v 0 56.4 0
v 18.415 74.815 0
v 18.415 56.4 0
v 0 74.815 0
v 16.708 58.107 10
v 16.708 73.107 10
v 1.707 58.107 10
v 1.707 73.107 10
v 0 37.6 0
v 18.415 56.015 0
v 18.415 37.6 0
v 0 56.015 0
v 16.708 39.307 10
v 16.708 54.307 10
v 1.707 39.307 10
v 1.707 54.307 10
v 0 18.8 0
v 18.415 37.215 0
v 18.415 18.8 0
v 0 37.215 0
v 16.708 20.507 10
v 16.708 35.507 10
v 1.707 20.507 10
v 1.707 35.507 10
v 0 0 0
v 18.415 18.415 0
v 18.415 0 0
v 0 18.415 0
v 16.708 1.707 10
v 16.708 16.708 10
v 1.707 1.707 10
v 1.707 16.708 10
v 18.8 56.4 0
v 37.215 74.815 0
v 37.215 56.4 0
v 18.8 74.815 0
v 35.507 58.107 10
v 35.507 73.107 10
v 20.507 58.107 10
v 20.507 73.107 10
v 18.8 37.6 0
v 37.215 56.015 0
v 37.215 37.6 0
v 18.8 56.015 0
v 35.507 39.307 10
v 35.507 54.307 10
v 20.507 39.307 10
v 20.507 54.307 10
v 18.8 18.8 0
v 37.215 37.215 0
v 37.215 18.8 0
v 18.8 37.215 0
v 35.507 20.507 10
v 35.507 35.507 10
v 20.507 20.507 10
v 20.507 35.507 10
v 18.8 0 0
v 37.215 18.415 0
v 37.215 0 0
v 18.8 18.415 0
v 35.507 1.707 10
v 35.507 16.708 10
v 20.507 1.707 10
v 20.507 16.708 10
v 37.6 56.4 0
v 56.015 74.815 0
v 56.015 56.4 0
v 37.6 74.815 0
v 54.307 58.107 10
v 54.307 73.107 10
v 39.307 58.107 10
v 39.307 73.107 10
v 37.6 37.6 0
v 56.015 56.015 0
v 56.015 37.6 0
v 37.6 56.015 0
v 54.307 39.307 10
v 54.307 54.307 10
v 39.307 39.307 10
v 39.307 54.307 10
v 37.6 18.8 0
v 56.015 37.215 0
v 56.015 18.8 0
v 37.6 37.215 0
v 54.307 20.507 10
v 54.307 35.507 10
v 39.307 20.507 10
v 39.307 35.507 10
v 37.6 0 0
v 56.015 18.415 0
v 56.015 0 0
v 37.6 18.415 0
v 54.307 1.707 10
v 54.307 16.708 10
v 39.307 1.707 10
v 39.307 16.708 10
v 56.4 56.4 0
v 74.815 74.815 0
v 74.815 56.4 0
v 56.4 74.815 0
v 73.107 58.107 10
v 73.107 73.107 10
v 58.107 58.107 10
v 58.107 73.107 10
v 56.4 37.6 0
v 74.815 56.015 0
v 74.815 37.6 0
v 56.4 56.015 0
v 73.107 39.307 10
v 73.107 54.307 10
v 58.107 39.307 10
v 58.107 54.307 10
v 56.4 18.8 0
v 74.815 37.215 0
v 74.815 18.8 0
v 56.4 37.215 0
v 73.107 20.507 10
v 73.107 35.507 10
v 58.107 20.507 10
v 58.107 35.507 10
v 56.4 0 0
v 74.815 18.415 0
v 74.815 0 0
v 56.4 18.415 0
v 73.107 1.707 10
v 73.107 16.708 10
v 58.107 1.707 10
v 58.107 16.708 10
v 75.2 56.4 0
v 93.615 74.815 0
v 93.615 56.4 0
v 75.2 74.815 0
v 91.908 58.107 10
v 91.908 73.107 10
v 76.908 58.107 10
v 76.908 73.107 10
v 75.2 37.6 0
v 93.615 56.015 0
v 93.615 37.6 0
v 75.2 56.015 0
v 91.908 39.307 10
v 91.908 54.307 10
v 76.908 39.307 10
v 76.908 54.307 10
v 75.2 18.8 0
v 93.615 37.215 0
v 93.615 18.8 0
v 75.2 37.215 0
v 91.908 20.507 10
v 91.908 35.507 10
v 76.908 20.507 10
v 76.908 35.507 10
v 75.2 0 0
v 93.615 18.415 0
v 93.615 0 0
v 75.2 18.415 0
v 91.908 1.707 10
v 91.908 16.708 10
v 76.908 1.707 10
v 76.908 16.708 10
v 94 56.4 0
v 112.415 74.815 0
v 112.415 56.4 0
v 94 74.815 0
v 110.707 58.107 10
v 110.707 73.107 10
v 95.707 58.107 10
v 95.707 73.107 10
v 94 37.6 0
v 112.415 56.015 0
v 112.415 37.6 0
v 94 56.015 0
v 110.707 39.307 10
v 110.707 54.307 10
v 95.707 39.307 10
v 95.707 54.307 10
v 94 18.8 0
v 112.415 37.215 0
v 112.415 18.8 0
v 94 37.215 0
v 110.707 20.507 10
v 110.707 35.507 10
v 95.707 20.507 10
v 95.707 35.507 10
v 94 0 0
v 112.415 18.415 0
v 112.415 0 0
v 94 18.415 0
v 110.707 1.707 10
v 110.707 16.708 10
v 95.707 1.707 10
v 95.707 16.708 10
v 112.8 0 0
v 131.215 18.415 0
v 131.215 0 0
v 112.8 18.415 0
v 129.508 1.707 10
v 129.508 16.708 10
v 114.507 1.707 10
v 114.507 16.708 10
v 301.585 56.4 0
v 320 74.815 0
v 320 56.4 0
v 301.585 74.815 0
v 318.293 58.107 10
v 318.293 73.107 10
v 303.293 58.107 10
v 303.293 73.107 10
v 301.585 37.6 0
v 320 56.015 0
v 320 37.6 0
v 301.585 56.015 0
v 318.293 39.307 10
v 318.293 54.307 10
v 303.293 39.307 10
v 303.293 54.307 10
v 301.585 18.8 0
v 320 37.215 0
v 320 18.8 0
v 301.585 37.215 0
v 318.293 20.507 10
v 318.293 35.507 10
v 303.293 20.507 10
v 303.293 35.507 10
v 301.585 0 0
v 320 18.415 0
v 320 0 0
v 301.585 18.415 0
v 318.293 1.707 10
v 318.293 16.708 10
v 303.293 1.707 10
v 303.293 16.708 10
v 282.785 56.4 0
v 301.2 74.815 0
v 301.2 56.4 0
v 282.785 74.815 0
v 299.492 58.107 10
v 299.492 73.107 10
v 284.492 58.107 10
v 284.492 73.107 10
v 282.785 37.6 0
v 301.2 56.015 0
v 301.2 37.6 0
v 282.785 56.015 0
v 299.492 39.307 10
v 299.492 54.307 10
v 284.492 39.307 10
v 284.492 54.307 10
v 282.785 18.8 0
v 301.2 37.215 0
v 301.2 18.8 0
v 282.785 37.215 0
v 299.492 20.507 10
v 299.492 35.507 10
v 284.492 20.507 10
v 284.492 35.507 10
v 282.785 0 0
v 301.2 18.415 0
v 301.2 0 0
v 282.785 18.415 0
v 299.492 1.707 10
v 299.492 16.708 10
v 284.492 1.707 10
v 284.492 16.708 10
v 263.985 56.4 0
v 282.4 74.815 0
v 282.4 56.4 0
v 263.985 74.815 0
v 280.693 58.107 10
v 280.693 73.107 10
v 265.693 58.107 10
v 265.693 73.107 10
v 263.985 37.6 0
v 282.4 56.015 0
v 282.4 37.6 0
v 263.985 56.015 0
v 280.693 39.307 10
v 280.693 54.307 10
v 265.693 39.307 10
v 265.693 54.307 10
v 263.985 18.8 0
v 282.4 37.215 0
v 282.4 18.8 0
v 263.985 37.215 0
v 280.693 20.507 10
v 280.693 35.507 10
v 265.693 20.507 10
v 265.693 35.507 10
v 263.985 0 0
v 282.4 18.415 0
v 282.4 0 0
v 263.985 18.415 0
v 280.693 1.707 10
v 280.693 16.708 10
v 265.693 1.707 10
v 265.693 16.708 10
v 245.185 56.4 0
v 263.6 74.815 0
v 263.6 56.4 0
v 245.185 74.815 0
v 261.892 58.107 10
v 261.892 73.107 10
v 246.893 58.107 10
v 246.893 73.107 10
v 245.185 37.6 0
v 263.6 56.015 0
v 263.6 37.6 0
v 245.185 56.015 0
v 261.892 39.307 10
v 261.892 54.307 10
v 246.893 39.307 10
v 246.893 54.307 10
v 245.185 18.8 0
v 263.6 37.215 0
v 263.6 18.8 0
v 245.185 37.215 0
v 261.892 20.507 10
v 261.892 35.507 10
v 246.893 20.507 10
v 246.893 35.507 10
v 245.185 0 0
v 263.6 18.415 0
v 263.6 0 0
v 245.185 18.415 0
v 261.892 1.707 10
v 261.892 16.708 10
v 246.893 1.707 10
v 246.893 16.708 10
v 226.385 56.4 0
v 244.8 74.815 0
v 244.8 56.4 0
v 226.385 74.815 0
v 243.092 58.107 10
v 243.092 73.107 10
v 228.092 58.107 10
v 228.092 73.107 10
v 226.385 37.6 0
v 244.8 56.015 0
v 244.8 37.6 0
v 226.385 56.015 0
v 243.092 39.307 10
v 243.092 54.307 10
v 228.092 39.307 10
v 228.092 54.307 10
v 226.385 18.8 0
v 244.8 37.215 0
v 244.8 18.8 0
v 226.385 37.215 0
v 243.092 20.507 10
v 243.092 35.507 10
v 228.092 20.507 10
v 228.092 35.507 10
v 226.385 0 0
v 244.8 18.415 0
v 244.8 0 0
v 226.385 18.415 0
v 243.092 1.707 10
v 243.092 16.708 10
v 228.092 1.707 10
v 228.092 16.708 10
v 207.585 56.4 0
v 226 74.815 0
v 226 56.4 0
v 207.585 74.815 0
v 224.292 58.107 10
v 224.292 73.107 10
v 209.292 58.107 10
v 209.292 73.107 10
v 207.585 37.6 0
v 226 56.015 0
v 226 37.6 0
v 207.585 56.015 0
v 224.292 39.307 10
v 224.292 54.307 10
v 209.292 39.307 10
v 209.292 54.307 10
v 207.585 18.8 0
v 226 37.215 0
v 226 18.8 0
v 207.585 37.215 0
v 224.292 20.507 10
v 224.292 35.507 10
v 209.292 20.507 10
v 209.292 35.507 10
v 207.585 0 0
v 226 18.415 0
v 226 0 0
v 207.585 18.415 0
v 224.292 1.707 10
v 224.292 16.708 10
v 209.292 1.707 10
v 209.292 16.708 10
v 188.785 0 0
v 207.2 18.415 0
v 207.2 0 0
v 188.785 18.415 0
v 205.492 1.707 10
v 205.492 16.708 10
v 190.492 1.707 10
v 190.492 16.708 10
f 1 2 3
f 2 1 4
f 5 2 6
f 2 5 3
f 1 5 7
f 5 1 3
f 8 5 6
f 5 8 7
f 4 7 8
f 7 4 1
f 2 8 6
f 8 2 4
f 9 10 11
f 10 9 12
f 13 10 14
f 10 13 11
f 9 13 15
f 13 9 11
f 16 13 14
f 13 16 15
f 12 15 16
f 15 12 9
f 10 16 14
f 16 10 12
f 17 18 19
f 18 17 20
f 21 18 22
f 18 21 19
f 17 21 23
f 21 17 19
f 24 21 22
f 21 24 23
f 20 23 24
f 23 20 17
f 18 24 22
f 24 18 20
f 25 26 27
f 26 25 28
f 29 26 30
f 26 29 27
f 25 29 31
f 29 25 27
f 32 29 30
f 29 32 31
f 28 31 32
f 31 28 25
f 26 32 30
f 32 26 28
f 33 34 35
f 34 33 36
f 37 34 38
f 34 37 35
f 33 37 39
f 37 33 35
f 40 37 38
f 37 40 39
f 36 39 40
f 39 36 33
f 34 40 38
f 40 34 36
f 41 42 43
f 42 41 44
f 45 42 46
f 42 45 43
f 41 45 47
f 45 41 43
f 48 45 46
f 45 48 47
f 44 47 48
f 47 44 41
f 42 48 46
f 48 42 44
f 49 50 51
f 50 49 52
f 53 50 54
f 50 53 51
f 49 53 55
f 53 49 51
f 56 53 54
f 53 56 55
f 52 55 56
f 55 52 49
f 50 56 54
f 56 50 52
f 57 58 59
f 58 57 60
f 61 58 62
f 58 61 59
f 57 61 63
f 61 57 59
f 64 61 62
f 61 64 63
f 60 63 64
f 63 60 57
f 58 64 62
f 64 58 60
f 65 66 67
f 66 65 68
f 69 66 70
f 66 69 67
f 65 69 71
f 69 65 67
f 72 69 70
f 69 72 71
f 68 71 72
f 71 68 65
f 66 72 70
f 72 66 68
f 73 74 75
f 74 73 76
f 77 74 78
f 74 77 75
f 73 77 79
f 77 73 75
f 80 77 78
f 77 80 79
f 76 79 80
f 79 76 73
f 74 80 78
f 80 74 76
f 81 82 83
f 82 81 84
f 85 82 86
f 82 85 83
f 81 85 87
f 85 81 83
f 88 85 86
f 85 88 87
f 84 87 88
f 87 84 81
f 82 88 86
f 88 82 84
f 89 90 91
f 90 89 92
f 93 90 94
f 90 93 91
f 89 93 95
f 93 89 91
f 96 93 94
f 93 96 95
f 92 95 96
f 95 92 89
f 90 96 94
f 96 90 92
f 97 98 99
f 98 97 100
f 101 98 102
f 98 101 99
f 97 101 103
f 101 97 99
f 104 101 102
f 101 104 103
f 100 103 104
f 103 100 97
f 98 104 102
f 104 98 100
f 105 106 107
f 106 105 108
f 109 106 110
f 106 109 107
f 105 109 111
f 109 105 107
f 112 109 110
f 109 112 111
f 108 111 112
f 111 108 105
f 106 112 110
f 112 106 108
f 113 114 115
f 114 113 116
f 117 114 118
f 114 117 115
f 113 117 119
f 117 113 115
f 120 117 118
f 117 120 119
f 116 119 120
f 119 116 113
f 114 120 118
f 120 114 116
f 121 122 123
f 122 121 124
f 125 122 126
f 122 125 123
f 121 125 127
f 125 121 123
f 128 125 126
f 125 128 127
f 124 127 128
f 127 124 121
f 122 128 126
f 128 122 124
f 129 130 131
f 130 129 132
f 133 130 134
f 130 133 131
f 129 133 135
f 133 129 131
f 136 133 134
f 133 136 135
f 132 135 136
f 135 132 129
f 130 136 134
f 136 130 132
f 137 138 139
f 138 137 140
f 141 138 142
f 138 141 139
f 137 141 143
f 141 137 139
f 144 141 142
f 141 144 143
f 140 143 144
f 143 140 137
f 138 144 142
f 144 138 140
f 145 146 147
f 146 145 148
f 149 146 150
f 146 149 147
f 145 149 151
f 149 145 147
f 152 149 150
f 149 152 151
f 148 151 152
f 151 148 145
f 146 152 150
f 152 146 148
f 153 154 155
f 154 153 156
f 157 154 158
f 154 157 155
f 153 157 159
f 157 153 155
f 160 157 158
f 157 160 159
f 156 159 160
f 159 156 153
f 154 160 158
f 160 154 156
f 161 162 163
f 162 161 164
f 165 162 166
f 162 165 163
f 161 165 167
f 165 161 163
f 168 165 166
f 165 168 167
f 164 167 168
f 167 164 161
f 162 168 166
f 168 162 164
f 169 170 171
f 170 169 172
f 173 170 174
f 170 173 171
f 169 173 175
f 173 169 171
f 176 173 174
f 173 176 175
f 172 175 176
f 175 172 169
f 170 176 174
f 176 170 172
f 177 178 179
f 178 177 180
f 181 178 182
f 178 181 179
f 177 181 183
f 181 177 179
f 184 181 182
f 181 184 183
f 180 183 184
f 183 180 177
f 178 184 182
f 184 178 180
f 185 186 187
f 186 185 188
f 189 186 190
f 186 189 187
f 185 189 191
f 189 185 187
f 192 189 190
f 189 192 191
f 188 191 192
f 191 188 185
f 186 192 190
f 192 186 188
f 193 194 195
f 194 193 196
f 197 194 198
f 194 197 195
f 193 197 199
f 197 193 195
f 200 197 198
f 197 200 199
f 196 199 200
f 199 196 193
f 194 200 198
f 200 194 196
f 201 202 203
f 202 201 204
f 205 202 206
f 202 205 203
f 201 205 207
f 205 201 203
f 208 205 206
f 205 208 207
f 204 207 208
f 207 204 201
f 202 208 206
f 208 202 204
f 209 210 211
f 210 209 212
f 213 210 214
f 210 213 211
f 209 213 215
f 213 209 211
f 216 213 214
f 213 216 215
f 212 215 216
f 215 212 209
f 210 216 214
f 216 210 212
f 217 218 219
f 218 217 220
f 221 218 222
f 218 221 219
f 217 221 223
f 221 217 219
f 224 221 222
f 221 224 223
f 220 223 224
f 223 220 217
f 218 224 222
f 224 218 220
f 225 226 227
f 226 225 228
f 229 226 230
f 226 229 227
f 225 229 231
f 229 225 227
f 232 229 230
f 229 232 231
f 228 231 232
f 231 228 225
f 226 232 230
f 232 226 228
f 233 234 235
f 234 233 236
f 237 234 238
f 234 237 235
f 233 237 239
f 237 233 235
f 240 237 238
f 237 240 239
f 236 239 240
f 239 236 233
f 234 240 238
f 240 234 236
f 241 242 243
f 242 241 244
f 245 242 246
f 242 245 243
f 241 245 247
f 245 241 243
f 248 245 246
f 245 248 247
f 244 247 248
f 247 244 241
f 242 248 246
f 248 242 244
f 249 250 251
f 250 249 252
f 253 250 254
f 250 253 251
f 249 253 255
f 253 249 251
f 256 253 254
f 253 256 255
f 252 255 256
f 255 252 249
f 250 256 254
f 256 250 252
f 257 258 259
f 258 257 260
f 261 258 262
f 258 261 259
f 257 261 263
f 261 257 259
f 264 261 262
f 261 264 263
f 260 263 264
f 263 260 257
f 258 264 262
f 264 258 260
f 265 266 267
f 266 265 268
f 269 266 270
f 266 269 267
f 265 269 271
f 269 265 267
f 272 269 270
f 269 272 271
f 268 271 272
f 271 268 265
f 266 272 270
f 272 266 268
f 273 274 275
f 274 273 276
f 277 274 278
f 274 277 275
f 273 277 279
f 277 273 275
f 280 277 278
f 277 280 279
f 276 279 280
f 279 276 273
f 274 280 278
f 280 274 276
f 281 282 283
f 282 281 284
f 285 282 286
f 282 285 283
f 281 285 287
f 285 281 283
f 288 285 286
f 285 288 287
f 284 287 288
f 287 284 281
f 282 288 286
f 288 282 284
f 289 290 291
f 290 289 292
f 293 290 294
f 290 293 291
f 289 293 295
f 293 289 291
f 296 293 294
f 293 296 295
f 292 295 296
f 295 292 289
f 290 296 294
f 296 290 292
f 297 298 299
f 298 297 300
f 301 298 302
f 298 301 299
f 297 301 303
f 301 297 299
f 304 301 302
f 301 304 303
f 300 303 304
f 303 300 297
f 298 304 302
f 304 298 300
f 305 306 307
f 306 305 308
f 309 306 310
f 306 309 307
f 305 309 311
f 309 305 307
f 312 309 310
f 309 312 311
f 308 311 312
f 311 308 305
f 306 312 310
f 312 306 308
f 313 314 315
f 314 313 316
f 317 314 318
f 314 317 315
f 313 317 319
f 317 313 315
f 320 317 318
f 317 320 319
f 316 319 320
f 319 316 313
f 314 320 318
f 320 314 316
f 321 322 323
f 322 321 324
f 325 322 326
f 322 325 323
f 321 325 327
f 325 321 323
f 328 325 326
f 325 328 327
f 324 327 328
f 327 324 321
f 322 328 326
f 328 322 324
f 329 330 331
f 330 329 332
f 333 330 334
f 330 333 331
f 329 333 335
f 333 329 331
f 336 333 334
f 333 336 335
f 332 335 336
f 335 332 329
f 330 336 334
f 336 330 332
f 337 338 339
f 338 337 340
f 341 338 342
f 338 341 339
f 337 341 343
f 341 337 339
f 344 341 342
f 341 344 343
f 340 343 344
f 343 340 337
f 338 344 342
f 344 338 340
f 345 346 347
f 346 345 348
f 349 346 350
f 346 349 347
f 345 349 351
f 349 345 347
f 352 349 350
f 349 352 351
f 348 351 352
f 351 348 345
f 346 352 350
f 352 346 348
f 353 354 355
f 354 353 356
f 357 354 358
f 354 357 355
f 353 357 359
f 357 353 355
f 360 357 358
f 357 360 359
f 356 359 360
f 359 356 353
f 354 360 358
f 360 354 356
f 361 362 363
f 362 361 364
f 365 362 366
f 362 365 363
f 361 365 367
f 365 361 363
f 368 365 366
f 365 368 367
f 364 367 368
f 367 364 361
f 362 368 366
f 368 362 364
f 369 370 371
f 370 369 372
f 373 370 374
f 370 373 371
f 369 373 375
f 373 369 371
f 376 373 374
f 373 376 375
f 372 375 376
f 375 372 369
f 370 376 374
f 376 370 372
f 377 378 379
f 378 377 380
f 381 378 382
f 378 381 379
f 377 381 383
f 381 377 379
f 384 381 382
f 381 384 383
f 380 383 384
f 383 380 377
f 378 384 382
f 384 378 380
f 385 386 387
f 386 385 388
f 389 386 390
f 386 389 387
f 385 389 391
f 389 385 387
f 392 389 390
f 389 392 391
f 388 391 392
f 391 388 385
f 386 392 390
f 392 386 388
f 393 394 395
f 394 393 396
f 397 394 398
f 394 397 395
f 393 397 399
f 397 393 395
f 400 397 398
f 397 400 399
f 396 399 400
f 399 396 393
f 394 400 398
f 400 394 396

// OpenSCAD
// KEYBOARD CONFIGS
KEY_PITCH = 18.8;

// normal row staggered
// LEFT_STAGGERING  = [0.50, 0.75, 0.25, 0.25];
// RIGHT_STAGGERING = [0.00, 0.75, 0.25, 0.25];

// ortho or column staggered
LEFT_STAGGERING  = [0.00, 0.00, 0.00, 0.00];
RIGHT_STAGGERING = [0.00, 0.00, 0.00, 0.00];

// curly
// ROTATION = [0, 3, 3, 3, 3, 3, 3, 3];
// OFFSET_Y = [0, 0, 0, 0, 0 ,0, 0, 0];

// straight
ROTATION = [0, 0, 0, 0, 0, 0, 0, 0];
OFFSET_Y = [0, 0, 0, 0, 0, 0, 0, 0];

// column staggered
// ROTATION = [0, 0, 0, 0, 0, 0, 0, 0];
// OFFSET_Y = [-10, -10, -6, -3, 0, -3, -6, -10];

// helix-like layut
KEY_EXISTENCE_TABLE = [
  [[1, 1, 1, 1, 1, 1, 0], [0, 1, 1, 1, 1, 1, 1]],
  [[1, 1, 1, 1, 1, 1, 0], [0, 1, 1, 1, 1, 1, 1]],
  [[1, 1, 1, 1, 1, 1, 0], [0, 1, 1, 1, 1, 1, 1]],
  [[1, 1, 1, 1, 1, 1, 1], [1, 1, 1, 1, 1, 1, 1]],
];

// KEYCAP CONFIGS
KEY_SIZE       = 18.415;
KEY_TOP_SIZE   = 15.000;
KEY_TOP_HEIGHT = 10;

// ---- keycap

module keycap_internal (size = 1) {
    offset = (KEY_SIZE - KEY_TOP_SIZE) / 2;
    difference () {
        polyhedron([
            [0, 0, 0],
            [KEY_SIZE * size, 0, 0],
            [KEY_SIZE * size, KEY_SIZE, 0],
            [0, KEY_SIZE, 0],
            [offset, offset, KEY_TOP_HEIGHT],
            [(offset + KEY_TOP_SIZE) * size, offset, KEY_TOP_HEIGHT],
            [(offset + KEY_TOP_SIZE) * size, offset + KEY_TOP_SIZE, KEY_TOP_HEIGHT],
            [offset, offset + KEY_TOP_SIZE, KEY_TOP_HEIGHT]
        ], [
            [0, 1, 2, 3],
            [4, 5, 1, 0],
            [7, 6, 5, 4],
            [5, 6, 2, 1],
            [6, 7, 3, 2],
            [7, 4, 0, 3]
        ]);
    }
}

module keycap (right = false, size = 1) {
    translate([right ? - KEY_SIZE : - (size - 1) * KEY_SIZE, 0, 0])
      keycap_internal(size);
}

module keycap_v (right = false, size = 1) {
  translate([right ? 0 : KEY_SIZE, 0, 0])
    rotate([0, 0, 90])
        keycap_internal(size);
}

// ---- keyboard

NUMBER_OF_LEFT_COLS  = len(KEY_EXISTENCE_TABLE[0][0]);
NUMBER_OF_RIGHT_COLS = len(KEY_EXISTENCE_TABLE[0][0]);
NUMBER_OF_ROWS       = len(KEY_EXISTENCE_TABLE);

module column (right = false, index = 0) {
    d = right ? 1 : -1;
    staggering = right ? RIGHT_STAGGERING : LEFT_STAGGERING;
    bottom_stag = staggering[NUMBER_OF_ROWS - 1];
    for (i = [0 : NUMBER_OF_ROWS - 1])
      if (KEY_EXISTENCE_TABLE[i][right ? 1 : 0][right ? NUMBER_OF_RIGHT_COLS - index - 1 : index])
        translate([d * (bottom_stag - staggering[i]) * KEY_PITCH, (NUMBER_OF_ROWS - 1 - i) * KEY_PITCH, 0])
          keycap(right, !index ? 1 + staggering[i] : 1);
}

module keyboard (right = false, from = 0) {
  d = right ? 1 : -1;
  rotate([0, 0, d * ROTATION[from]]) {
    translate([0, OFFSET_Y[from], 0])
        column(right, from);
    if (from < (right ? NUMBER_OF_RIGHT_COLS : NUMBER_OF_LEFT_COLS))
      translate([- d * KEY_PITCH,  0, 0])
        keyboard(right, from + 1);
  }
}


//-----

keyboard();
translate([320, 0, 0]) keyboard(true);
